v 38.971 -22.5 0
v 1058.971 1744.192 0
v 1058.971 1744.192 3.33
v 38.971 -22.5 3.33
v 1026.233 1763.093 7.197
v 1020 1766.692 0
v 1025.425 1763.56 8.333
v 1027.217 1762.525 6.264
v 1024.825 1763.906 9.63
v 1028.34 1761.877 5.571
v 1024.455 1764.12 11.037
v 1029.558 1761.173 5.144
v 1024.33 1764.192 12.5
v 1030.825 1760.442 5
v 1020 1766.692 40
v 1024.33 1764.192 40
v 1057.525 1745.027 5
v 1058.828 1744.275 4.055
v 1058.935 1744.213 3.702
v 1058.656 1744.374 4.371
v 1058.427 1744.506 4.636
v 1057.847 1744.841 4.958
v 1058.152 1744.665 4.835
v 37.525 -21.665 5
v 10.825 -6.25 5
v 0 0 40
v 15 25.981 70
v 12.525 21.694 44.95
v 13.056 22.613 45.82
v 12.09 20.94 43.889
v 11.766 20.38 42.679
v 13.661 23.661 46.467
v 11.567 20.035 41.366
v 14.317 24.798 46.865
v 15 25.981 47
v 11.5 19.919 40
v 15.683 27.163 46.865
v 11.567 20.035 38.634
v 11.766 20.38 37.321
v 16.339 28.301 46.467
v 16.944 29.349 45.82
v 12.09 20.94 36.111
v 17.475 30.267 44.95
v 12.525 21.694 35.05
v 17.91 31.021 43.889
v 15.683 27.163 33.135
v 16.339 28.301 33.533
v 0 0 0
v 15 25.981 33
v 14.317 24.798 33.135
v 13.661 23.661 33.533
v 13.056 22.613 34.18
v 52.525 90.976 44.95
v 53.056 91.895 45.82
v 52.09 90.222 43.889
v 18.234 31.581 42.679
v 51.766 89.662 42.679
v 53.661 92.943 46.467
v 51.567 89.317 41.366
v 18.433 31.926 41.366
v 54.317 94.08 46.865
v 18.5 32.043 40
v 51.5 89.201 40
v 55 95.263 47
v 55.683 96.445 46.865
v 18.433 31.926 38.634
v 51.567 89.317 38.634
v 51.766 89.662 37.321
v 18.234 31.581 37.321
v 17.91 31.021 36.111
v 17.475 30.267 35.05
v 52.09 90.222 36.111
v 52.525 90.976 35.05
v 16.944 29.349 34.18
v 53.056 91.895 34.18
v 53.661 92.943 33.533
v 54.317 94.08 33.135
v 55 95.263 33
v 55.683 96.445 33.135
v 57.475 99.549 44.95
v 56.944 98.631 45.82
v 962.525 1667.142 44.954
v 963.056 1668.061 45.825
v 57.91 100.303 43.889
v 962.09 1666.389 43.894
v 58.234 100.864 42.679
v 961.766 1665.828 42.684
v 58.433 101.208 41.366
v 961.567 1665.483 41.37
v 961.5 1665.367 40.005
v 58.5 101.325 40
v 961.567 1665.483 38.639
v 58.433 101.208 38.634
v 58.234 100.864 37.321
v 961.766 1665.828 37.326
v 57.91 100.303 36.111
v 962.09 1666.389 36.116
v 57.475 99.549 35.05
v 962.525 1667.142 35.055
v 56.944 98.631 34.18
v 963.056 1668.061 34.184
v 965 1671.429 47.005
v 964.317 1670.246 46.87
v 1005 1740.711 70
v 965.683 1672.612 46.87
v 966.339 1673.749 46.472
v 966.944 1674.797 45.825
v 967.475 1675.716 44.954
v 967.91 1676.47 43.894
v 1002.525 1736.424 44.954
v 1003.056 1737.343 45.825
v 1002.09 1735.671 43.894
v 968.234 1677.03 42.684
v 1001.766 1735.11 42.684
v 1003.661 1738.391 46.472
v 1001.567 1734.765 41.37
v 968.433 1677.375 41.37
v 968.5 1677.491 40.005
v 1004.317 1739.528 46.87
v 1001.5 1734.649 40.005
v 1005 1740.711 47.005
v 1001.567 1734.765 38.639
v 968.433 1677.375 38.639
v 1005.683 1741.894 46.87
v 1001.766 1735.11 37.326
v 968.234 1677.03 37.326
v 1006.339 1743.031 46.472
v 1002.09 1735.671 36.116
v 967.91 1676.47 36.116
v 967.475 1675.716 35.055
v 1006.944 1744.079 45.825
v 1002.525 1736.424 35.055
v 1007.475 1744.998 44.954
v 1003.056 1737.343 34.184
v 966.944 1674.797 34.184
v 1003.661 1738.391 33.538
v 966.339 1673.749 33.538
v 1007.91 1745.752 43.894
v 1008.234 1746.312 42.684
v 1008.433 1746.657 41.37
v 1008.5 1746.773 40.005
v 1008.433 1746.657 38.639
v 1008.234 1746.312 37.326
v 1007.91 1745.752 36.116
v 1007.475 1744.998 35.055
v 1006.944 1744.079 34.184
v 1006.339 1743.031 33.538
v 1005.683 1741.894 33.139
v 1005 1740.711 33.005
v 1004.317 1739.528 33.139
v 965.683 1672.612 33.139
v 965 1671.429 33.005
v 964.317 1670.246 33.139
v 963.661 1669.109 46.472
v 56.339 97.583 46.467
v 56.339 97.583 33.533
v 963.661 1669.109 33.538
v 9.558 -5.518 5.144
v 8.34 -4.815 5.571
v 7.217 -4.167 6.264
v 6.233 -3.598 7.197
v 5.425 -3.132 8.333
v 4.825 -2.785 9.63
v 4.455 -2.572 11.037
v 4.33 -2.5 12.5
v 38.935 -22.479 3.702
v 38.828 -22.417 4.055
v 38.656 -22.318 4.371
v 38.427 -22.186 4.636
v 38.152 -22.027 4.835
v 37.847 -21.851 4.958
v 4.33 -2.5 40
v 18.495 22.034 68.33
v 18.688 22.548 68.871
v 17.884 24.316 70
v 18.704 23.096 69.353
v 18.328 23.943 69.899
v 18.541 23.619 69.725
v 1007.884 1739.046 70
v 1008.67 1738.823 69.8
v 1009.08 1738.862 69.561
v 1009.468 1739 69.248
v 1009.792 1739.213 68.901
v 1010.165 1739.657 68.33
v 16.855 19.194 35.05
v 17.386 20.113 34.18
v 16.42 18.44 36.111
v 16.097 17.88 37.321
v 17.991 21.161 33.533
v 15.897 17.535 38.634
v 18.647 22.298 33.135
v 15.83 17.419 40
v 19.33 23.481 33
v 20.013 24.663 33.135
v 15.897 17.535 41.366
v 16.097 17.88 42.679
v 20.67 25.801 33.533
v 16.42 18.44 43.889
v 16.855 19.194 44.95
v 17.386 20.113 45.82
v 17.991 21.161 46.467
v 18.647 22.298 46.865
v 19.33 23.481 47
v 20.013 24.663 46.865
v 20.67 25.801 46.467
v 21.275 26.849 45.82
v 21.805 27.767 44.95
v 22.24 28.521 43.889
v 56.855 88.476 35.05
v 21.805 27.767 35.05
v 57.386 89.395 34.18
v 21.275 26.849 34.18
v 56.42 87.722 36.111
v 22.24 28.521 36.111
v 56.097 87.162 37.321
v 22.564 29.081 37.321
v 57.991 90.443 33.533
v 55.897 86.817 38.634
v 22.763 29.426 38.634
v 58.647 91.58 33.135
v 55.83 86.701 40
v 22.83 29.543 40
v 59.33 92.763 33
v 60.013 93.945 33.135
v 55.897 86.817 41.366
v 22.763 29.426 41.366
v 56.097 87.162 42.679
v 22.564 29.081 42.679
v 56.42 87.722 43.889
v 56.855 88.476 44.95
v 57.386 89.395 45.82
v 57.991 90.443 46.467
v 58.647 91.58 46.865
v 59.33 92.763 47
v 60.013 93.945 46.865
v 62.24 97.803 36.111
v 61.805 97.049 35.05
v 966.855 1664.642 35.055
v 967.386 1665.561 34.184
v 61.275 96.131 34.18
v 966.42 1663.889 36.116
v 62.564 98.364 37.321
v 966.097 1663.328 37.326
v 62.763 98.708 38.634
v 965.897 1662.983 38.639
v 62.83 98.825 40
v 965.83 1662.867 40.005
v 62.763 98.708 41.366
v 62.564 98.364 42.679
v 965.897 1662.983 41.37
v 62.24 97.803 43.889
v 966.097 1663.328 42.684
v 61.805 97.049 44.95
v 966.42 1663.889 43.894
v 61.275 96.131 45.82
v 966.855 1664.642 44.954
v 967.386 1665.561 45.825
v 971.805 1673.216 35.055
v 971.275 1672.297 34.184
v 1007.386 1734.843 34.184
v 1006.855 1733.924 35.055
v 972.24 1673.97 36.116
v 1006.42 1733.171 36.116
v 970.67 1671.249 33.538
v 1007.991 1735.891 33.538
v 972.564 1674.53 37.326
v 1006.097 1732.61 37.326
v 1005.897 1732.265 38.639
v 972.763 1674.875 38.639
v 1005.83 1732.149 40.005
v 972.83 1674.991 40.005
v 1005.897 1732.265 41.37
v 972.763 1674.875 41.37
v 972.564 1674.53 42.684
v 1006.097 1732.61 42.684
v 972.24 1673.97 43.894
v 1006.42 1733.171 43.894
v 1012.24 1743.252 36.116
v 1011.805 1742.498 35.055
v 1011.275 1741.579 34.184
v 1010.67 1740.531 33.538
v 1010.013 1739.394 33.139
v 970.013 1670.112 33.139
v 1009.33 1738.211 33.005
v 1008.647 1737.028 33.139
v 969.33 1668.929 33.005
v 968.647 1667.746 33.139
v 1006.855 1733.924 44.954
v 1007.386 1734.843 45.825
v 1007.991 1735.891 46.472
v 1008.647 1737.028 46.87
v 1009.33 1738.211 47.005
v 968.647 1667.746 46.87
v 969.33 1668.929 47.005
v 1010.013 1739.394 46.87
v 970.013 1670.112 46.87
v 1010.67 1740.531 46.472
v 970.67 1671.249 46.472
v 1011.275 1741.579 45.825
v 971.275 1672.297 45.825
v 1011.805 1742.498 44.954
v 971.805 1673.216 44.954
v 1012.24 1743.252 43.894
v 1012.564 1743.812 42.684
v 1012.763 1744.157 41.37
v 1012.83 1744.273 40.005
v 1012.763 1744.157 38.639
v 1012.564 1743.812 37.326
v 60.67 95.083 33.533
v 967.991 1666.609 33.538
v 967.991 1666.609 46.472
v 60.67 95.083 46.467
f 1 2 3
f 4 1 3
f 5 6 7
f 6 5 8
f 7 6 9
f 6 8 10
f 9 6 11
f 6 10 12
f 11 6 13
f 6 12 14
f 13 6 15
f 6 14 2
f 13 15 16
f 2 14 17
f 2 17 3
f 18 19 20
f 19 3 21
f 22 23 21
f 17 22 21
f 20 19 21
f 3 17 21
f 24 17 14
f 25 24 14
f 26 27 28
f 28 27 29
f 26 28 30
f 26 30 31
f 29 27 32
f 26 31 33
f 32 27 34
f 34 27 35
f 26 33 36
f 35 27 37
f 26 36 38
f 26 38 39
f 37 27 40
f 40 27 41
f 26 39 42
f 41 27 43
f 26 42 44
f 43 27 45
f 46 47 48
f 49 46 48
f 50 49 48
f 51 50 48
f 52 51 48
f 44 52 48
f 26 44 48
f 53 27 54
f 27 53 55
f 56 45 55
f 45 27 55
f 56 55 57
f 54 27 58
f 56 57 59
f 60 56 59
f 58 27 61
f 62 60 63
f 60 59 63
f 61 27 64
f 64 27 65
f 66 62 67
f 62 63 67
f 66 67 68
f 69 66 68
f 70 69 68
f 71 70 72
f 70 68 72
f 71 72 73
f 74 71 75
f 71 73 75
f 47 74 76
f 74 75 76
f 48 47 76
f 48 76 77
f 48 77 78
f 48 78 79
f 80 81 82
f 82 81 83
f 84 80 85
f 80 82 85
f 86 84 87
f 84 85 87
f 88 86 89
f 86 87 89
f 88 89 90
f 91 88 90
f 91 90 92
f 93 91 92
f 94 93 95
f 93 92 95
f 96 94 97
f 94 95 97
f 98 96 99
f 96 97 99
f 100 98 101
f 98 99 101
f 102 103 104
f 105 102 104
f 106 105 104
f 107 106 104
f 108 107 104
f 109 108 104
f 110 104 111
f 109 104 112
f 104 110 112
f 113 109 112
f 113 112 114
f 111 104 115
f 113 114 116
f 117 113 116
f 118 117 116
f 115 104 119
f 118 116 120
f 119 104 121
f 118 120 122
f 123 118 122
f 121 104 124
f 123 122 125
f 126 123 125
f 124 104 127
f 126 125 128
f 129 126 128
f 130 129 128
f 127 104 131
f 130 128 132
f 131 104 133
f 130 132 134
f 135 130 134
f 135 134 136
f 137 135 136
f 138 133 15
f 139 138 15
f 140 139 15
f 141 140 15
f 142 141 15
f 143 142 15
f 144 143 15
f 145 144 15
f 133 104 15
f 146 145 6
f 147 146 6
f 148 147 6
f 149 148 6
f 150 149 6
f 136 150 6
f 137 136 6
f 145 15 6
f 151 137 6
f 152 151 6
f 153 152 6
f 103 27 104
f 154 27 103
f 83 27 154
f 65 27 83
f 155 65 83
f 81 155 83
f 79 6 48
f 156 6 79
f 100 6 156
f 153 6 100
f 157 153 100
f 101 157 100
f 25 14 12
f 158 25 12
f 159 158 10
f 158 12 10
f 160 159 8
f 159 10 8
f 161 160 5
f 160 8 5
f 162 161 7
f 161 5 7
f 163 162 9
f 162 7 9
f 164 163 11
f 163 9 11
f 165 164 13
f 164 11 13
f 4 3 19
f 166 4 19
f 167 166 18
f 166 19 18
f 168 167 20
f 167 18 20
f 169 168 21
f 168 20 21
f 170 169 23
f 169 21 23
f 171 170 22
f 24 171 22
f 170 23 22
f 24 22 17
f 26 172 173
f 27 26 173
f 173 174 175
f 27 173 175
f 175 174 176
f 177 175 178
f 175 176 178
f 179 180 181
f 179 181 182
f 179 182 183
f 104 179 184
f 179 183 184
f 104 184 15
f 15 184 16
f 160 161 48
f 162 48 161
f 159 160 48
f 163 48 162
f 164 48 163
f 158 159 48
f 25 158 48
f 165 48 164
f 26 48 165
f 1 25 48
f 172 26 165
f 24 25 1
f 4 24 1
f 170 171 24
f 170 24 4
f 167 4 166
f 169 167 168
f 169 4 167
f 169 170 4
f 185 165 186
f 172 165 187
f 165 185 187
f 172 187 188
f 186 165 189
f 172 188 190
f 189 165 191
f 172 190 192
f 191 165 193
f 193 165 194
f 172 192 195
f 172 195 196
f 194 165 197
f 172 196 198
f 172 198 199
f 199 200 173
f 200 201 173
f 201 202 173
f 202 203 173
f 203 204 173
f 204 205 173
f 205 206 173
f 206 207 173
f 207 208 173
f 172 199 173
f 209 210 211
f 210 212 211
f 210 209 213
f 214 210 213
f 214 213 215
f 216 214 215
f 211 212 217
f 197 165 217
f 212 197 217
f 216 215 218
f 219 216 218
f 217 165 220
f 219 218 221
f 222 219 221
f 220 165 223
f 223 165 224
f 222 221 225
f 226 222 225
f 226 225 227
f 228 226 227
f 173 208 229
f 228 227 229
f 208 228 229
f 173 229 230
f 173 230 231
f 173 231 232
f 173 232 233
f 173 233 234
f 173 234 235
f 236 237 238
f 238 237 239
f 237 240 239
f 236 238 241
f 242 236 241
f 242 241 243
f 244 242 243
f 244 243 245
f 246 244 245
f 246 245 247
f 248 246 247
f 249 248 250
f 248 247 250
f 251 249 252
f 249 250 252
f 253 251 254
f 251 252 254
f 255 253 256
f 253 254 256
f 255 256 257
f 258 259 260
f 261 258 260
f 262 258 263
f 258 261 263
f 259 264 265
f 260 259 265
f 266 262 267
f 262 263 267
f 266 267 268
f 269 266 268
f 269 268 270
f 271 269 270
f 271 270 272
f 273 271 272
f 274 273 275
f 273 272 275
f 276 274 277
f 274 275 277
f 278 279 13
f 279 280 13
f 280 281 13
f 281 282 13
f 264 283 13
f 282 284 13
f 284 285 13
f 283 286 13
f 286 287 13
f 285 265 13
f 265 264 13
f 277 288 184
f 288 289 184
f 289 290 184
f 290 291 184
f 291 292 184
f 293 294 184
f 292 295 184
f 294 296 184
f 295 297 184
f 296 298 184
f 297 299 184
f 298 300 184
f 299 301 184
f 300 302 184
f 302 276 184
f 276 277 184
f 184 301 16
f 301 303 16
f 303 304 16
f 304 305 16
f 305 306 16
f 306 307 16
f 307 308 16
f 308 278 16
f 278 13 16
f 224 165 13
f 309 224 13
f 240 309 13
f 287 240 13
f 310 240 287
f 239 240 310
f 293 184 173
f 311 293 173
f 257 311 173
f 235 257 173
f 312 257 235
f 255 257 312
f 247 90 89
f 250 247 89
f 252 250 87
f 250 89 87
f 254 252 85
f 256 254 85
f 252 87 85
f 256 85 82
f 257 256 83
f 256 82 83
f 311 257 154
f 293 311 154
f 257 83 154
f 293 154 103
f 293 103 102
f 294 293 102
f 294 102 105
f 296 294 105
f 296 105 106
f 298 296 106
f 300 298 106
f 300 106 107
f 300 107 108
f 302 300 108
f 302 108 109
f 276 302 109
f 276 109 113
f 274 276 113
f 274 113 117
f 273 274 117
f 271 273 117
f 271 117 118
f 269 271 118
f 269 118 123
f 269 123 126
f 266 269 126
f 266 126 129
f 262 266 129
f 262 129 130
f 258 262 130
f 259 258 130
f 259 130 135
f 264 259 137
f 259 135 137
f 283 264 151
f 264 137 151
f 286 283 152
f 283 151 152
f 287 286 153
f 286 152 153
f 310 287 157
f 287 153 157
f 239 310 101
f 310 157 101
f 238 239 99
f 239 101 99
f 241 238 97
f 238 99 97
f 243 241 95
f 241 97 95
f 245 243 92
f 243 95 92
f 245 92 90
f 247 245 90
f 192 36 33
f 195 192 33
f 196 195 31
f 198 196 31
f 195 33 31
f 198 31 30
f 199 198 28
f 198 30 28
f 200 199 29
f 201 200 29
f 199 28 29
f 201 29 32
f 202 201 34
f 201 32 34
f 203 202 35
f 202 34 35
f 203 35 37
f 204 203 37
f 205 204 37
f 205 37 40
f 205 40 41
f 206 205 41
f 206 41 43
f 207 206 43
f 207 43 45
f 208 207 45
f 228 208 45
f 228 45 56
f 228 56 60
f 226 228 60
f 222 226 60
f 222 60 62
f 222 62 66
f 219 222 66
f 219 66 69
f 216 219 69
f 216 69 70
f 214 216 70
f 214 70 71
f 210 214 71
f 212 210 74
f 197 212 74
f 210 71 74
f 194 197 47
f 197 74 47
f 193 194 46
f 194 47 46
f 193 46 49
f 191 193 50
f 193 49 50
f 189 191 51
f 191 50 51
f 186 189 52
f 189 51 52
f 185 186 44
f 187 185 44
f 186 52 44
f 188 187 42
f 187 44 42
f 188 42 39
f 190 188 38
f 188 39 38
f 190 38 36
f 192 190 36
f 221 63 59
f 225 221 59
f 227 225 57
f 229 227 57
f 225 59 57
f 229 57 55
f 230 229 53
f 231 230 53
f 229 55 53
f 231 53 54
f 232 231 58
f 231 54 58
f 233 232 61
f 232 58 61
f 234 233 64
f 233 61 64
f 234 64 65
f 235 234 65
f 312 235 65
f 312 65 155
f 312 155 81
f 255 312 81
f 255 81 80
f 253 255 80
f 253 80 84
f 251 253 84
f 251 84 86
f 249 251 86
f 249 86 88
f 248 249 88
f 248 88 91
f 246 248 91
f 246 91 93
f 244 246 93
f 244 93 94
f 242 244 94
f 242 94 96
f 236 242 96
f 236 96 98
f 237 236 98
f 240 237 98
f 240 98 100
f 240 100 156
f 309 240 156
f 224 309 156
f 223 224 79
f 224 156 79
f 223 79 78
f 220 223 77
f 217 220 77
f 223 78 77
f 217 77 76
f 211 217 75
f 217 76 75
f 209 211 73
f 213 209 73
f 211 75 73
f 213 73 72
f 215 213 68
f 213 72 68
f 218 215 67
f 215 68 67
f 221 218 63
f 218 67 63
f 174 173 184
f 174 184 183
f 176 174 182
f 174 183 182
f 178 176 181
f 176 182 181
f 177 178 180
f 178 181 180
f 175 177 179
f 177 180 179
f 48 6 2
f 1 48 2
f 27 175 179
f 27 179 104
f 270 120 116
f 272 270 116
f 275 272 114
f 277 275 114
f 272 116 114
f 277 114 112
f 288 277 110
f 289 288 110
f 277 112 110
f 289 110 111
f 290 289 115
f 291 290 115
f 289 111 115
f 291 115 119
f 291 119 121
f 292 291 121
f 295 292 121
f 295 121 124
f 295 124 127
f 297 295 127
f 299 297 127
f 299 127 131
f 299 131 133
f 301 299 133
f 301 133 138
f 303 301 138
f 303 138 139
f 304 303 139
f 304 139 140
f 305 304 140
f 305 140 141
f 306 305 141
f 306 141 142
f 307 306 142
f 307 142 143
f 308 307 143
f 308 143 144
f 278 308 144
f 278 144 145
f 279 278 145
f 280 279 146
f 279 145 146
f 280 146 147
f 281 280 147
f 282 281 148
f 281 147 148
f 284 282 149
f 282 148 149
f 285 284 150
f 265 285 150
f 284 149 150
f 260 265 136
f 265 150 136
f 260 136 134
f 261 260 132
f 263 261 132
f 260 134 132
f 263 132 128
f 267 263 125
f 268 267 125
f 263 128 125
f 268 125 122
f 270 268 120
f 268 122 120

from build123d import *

# Parameters (mm, degrees)
F_70X45X5_1_DEPTH   = 2040
CUT_EXTRUDE_1_REACH = 2062.951
SKETCH_12_R         = 7
CUT_EXTRUDE_2_REACH = 2062.951
SKETCH_13_R         = 7
CHAMFER_1_SIZE      = 30
CHAMFER_2_SIZE      = 30


with BuildPart() as part:
    # 草图11 → 不等边角钢 70X45X5(1) (new body)
    with BuildSketch(Plane(origin=(1020, 1766.69182372, 0), x_dir=(0.86602540378444, -0.49999999999999784, 0), z_dir=(-0.49999999999999784, -0.86602540378444, 0))):
        with BuildLine():
            Line((0, 70), (0, 0))
            Line((0, 0), (45, 0))
            Line((45, 0), (45, 3.33))
            ThreePointArc((45, 3.33), (44.510868325, 4.510868325), (43.33, 5))
            Line((43.33, 5), (12.5, 5))
            ThreePointArc((12.5, 5), (7.196699141, 7.196699141), (5, 12.5))
            Line((5, 12.5), (5, 68.33))
            ThreePointArc((5, 68.33), (4.510868325, 69.510868325), (3.33, 70))
            Line((3.33, 70), (0, 70))
        make_face()
    extrude(amount=F_70X45X5_1_DEPTH)

    # 草图12 → 切除-拉伸1 (cut, up to next)
    with BuildSketch(Plane(origin=(0, 0, 0), x_dir=(0, 0, 1), z_dir=(-0.86602540378444, 0.49999999999999784, 0)), mode=Mode.PRIVATE) as cut_extrude_1_sk1:
        with Locations(Location((40, 30, 0), (0, 0, 270))):
            Circle(SKETCH_12_R)
    cut_extrude_1_tool1 = extrude(cut_extrude_1_sk1.sketch, amount=-CUT_EXTRUDE_1_REACH, mode=Mode.PRIVATE) & part.part
    # 草图12 → 切除-拉伸1 (cut, up to next)
    with BuildSketch(Plane(origin=(0, 0, 0), x_dir=(0, 0, 1), z_dir=(-0.86602540378444, 0.49999999999999784, 0)), mode=Mode.PRIVATE) as cut_extrude_1_sk2:
        with Locations(Location((40, 110, 0), (0, 0, 270))):
            Circle(SKETCH_12_R)
    cut_extrude_1_tool2 = extrude(cut_extrude_1_sk2.sketch, amount=-CUT_EXTRUDE_1_REACH, mode=Mode.PRIVATE) & part.part
    add(cut_extrude_1_tool1.solids().sort_by_distance((15, 25.980762, 40))[0], mode=Mode.SUBTRACT)
    add(cut_extrude_1_tool2.solids().sort_by_distance((55, 95.262794, 40))[0], mode=Mode.SUBTRACT)

    # 草图13 → 切除-拉伸2 (cut, up to next)
    with BuildSketch(Plane(origin=(0, 0, 0), x_dir=(0, 0, 1), z_dir=(-0.86602540378444, 0.49999999999999784, 0)), mode=Mode.PRIVATE) as cut_extrude_2_sk1:
        with Locations(Location((40.004723234, 1930, 0), (0, 0, 270))):
            Circle(SKETCH_13_R)
    cut_extrude_2_tool1 = extrude(cut_extrude_2_sk1.sketch, amount=-CUT_EXTRUDE_2_REACH, mode=Mode.PRIVATE) & part.part
    # 草图13 → 切除-拉伸2 (cut, up to next)
    with BuildSketch(Plane(origin=(0, 0, 0), x_dir=(0, 0, 1), z_dir=(-0.86602540378444, 0.49999999999999784, 0)), mode=Mode.PRIVATE) as cut_extrude_2_sk2:
        with Locations(Location((40.004723234, 2010, 0), (0, 0, 270))):
            Circle(SKETCH_13_R)
    cut_extrude_2_tool2 = extrude(cut_extrude_2_sk2.sketch, amount=-CUT_EXTRUDE_2_REACH, mode=Mode.PRIVATE) & part.part
    add(cut_extrude_2_tool1.solids().sort_by_distance((965, 1671.429029, 40.004723))[0], mode=Mode.SUBTRACT)
    add(cut_extrude_2_tool2.solids().sort_by_distance((1005, 1740.711062, 40.004723))[0], mode=Mode.SUBTRACT)

    # 倒角1
    # the kernel refuses this chamfer: 30 mm, written as the material it takes off along each edge
    with BuildSketch(Plane(origin=(1089.698148536, 1726.451578901, 70), x_dir=(-0.49981095845564616, -0.8656979742248816, 0.027495876610586854), z_dir=(-0.86602540378444, 0.49999999999999784, 0))) as chamfer_1_piece_1:
        Polygon((CHAMFER_1_SIZE * 0.999621916911, -CHAMFER_1_SIZE * 0.0274958766106), (-CHAMFER_1_SIZE * 0.0274958766106, -CHAMFER_1_SIZE * 0.999621916911), (0, 0), align=None)
    extrude(amount=157.630979278, mode=Mode.SUBTRACT)

    # 倒角2
    # the kernel refuses this chamfer: 30 mm, written as the material it takes off along each edge
    with BuildSketch(Plane(origin=(69.698148536, -40.240244819, 70), x_dir=(-0.013747938305293054, -0.023812127644090075, -0.9996219169112966), z_dir=(-0.86602540378444, 0.49999999999999784, 0))) as chamfer_2_piece_1:
        Polygon((CHAMFER_2_SIZE * 0.999621916911, -CHAMFER_2_SIZE * 0.0274958766106), (-CHAMFER_2_SIZE * 0.0274958766106, -CHAMFER_2_SIZE * 0.999621916911), (0, 0), align=None)
    extrude(amount=157.630979278, mode=Mode.SUBTRACT)


solid = part.part
